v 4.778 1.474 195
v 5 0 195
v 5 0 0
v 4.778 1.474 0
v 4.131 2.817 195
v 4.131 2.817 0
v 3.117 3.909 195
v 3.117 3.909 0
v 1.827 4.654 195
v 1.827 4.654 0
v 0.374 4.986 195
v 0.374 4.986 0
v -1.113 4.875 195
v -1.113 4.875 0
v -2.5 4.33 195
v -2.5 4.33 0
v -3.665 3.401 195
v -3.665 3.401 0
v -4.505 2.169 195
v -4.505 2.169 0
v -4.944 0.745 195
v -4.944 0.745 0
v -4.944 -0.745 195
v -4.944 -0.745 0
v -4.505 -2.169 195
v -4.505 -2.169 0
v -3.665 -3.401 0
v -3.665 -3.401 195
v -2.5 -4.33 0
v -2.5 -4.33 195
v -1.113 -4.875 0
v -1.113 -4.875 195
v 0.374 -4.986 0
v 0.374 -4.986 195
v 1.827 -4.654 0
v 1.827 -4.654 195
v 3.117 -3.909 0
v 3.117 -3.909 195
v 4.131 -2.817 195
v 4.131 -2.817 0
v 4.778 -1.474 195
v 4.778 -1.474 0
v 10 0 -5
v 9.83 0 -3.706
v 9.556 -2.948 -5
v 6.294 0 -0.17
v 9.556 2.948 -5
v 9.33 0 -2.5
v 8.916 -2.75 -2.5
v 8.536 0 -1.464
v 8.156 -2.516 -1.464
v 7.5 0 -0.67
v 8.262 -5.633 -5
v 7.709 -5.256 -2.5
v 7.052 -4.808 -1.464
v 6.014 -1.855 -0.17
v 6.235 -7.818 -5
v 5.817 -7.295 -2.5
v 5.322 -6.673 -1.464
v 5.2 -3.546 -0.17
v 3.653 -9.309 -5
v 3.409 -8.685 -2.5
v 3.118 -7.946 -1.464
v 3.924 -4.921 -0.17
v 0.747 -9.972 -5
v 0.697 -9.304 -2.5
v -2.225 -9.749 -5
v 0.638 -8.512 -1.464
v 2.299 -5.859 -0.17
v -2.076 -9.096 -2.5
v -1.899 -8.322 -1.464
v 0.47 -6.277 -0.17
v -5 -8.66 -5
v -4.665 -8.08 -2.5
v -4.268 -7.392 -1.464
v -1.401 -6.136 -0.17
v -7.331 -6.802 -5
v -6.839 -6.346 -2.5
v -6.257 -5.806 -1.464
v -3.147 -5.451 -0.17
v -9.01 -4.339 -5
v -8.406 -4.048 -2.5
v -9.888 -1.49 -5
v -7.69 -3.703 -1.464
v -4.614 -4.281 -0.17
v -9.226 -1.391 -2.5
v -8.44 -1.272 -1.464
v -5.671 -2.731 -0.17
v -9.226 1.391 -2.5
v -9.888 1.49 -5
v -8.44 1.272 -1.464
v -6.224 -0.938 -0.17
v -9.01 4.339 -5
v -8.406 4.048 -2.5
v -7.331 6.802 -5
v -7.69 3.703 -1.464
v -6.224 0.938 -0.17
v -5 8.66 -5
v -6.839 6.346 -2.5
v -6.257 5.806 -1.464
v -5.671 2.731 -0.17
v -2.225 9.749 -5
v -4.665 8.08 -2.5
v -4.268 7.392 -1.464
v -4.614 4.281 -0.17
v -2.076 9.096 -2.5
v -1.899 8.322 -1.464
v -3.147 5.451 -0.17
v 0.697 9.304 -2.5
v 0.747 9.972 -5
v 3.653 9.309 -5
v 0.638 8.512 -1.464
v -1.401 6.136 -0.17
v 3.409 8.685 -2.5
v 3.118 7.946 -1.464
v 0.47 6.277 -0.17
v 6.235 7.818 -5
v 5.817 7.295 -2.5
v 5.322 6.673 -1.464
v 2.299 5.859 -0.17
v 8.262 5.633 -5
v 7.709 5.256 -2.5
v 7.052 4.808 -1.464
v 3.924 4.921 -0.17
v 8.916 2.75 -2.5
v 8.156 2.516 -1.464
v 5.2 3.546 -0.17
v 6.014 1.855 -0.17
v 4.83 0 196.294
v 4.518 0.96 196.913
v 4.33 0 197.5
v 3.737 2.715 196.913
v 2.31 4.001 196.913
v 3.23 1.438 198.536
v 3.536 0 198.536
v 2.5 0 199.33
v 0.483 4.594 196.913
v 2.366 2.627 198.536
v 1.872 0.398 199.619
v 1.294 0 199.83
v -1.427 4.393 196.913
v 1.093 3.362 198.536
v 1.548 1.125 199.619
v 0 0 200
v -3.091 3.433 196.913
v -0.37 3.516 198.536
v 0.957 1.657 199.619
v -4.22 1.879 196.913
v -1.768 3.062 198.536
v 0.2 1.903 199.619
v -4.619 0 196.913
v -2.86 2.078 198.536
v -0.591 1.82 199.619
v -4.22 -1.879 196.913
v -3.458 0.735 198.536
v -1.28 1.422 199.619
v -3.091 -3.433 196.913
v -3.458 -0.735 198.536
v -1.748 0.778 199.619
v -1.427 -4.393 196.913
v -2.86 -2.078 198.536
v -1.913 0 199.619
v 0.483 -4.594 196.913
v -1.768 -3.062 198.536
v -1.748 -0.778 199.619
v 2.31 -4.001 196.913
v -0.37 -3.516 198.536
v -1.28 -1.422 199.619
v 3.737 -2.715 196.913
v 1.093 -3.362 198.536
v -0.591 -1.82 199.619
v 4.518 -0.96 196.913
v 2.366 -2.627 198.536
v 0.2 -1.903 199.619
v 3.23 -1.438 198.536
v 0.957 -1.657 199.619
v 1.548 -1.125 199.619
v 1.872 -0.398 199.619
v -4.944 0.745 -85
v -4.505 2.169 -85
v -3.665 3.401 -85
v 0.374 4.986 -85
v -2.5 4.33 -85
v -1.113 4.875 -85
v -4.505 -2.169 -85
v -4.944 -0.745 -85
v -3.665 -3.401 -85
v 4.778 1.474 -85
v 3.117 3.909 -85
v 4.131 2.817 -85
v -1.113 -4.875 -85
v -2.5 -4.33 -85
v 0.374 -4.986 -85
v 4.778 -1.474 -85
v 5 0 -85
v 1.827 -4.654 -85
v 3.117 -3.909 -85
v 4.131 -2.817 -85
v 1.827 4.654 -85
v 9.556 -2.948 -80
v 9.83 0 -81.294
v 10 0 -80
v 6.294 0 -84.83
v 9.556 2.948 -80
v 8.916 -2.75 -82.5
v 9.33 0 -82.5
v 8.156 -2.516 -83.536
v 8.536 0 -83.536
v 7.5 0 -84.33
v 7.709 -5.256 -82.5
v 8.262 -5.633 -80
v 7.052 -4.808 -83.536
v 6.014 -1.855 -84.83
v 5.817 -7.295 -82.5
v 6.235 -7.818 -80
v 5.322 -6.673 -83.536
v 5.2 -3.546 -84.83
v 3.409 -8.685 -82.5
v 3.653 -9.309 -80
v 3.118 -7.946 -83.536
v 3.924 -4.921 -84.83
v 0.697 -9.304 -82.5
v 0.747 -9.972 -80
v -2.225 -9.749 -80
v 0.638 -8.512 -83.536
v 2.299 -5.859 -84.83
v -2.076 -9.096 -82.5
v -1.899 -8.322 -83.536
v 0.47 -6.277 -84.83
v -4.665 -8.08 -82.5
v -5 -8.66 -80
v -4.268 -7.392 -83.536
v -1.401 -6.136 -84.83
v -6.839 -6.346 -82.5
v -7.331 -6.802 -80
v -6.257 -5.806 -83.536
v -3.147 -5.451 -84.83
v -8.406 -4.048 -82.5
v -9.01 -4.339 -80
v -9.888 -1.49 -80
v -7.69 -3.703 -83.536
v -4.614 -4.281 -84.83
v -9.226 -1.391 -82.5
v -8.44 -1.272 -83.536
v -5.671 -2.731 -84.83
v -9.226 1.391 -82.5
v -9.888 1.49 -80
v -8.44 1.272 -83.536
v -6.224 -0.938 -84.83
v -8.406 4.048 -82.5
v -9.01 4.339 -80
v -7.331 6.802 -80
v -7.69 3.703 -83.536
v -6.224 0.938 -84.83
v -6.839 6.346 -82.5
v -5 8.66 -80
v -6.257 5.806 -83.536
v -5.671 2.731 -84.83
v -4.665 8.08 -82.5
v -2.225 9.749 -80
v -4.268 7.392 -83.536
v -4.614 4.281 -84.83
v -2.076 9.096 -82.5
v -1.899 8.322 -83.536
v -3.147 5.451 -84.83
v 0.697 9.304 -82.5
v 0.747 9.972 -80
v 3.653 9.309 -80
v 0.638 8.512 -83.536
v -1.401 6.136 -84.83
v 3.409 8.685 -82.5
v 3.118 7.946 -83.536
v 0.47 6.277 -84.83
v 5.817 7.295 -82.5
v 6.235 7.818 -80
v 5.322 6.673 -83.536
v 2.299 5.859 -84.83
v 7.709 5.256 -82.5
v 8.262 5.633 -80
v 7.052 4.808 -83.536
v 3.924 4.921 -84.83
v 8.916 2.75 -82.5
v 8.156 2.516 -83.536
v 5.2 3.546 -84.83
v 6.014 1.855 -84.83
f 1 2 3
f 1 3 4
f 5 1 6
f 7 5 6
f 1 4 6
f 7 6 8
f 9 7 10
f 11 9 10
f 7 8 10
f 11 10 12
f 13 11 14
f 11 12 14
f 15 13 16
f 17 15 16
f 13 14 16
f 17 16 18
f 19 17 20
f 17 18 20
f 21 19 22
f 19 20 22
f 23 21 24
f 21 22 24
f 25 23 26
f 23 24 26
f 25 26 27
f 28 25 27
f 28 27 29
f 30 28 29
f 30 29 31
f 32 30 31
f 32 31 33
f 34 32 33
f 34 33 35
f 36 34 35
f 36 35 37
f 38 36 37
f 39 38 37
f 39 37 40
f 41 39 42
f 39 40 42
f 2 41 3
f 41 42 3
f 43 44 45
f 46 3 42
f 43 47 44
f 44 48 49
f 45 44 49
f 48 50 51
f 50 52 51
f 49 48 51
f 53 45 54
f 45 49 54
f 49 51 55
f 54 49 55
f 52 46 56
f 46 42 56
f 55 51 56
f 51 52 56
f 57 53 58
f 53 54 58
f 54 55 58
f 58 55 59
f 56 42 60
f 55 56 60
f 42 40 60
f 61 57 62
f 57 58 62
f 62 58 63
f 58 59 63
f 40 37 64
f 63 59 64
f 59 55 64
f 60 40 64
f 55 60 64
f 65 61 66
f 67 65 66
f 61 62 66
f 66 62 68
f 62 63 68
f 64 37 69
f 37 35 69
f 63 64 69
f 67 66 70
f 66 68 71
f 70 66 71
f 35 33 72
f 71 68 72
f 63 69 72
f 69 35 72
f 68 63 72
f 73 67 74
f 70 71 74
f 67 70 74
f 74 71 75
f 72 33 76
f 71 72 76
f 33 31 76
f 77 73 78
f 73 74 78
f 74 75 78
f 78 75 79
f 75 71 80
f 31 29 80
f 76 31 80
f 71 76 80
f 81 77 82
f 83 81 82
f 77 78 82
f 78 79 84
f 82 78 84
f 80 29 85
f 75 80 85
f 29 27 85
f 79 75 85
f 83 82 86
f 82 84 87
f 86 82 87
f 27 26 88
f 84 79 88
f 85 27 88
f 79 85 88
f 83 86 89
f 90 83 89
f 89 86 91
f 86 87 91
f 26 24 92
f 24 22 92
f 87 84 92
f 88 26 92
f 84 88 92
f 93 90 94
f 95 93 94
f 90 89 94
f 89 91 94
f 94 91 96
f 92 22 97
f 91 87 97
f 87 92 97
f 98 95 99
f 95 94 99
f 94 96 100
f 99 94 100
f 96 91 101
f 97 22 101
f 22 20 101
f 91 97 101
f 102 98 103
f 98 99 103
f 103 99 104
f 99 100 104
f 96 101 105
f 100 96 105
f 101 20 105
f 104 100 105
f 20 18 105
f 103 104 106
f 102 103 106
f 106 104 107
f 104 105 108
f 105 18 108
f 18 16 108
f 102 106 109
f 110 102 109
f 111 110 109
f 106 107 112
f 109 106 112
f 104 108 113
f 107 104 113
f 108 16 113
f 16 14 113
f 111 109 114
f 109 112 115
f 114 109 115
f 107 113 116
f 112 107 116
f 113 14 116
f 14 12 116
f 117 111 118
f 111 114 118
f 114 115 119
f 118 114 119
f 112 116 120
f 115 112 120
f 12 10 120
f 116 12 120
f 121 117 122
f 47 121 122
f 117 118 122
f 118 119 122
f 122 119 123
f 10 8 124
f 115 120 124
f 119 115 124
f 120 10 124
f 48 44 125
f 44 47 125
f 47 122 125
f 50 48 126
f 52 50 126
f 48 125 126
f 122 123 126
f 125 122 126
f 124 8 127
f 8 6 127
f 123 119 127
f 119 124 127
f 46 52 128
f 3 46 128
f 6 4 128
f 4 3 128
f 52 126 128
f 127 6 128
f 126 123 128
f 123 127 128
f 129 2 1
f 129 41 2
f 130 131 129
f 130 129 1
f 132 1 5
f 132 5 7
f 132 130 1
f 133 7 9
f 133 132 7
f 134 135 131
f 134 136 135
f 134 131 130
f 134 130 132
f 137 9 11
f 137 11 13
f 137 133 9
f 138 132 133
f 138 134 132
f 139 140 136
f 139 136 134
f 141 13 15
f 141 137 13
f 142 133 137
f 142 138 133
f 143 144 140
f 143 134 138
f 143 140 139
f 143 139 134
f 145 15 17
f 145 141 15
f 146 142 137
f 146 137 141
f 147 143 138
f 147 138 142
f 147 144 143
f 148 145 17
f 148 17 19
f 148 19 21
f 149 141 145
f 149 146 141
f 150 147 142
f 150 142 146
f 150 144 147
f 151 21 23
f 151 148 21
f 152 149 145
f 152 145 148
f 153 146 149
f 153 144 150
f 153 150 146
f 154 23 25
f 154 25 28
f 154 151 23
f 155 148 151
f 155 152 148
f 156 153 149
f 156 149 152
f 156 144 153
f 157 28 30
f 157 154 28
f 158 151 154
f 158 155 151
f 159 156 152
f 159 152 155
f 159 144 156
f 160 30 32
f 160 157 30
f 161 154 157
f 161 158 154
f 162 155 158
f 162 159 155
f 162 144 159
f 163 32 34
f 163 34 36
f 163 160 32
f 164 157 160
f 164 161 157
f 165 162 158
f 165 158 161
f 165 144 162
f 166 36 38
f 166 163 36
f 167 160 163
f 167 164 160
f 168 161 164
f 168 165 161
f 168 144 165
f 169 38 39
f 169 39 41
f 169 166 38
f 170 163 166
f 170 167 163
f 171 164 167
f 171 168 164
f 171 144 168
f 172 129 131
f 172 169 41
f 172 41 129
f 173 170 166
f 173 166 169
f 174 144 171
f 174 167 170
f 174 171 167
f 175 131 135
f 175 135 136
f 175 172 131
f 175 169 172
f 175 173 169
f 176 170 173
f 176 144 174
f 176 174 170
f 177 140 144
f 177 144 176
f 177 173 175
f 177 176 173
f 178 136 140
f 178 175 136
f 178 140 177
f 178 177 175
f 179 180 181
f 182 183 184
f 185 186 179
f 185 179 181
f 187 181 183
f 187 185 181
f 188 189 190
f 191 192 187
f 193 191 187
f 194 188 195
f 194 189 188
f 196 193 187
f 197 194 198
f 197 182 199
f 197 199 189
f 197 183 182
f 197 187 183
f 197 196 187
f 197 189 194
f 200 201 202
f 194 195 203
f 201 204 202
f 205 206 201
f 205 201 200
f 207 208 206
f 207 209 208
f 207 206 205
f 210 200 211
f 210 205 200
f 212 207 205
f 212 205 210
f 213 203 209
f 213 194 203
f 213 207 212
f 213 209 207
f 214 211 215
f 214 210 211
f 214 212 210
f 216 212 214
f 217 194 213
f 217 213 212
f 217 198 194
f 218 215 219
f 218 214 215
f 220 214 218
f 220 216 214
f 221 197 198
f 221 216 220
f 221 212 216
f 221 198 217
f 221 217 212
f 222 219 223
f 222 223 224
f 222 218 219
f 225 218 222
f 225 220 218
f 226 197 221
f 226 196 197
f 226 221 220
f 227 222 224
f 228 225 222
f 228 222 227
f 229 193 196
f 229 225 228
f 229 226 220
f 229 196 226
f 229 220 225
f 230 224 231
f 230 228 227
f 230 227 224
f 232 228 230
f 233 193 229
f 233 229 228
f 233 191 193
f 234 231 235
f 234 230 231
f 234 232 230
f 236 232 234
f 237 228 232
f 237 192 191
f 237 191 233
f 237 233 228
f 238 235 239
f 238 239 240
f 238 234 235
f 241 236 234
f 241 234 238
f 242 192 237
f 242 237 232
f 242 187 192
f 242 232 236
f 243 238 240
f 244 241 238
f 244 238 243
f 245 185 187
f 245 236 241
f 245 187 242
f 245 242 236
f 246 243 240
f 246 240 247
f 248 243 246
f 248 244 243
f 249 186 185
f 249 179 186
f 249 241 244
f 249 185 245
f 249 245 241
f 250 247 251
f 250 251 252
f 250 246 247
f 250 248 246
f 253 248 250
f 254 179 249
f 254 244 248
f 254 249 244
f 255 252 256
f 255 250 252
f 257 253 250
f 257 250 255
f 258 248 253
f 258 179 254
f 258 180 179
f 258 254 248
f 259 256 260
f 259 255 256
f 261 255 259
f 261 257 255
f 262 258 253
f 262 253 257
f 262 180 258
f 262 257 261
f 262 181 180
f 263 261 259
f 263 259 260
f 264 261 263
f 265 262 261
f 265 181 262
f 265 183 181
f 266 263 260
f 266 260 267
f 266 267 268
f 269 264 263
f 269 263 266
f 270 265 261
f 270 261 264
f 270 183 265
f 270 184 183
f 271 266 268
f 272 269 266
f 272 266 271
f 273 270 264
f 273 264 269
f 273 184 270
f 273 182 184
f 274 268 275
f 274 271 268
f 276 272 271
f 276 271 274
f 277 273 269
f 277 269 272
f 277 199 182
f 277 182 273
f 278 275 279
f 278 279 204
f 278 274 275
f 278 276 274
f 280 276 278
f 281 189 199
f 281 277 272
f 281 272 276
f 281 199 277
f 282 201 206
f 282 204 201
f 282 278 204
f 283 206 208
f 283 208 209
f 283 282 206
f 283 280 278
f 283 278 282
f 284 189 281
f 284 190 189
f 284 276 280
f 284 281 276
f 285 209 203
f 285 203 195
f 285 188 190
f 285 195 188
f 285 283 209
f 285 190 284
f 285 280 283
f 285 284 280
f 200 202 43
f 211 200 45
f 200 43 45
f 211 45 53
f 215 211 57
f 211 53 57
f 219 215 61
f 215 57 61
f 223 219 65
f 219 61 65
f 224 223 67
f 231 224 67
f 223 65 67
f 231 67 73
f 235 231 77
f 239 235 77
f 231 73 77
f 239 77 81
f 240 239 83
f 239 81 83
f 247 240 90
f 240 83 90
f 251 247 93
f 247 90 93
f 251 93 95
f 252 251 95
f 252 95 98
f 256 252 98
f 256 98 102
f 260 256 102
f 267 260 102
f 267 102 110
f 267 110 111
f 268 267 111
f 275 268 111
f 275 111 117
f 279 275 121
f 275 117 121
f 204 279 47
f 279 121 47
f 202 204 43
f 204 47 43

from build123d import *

# Parameters (mm, degrees)
F0_R     = 5
F1_DEPTH = 200
F2_R     = 10
F2_R_2   = 5
F3_DEPTH = 85
F4_R     = 4.99999
F5_R     = 5


# Not quite as in the source:
# - a fillet or chamfer is up to 0.001 mm smaller than in the source, because OpenCascade refuses the exact size


with BuildPart() as f1:
    # F0 (on Top) → F1 (new body)
    with BuildSketch(Plane.XY):
        Circle(F0_R)
    extrude(amount=F1_DEPTH)

    # F2 (on face) → F3 (join)
    with BuildSketch(Plane(origin=(0, 0, 0), x_dir=(1, 0, 0), z_dir=(0, 0, -1))):
        Circle(F2_R)
        Circle(F2_R_2, mode=Mode.SUBTRACT)
        Circle(F2_R_2)
    extrude(amount=F3_DEPTH)

    # F4 (radius 5 in the source; OpenCascade refuses exactly that, so slightly less here)
    f4_edges = [f1.edges().sort_by_distance(p)[0] for p in [
        (-10, 0, 0),
        (-10, 0, -85),
    ]]
    fillet(f4_edges, radius=F4_R)

    # F5
    f5_edges = [f1.edges().sort_by_distance(p)[0] for p in [
        (-5, 0, 200),
    ]]
    fillet(f5_edges, radius=F5_R)


solid = f1.part
